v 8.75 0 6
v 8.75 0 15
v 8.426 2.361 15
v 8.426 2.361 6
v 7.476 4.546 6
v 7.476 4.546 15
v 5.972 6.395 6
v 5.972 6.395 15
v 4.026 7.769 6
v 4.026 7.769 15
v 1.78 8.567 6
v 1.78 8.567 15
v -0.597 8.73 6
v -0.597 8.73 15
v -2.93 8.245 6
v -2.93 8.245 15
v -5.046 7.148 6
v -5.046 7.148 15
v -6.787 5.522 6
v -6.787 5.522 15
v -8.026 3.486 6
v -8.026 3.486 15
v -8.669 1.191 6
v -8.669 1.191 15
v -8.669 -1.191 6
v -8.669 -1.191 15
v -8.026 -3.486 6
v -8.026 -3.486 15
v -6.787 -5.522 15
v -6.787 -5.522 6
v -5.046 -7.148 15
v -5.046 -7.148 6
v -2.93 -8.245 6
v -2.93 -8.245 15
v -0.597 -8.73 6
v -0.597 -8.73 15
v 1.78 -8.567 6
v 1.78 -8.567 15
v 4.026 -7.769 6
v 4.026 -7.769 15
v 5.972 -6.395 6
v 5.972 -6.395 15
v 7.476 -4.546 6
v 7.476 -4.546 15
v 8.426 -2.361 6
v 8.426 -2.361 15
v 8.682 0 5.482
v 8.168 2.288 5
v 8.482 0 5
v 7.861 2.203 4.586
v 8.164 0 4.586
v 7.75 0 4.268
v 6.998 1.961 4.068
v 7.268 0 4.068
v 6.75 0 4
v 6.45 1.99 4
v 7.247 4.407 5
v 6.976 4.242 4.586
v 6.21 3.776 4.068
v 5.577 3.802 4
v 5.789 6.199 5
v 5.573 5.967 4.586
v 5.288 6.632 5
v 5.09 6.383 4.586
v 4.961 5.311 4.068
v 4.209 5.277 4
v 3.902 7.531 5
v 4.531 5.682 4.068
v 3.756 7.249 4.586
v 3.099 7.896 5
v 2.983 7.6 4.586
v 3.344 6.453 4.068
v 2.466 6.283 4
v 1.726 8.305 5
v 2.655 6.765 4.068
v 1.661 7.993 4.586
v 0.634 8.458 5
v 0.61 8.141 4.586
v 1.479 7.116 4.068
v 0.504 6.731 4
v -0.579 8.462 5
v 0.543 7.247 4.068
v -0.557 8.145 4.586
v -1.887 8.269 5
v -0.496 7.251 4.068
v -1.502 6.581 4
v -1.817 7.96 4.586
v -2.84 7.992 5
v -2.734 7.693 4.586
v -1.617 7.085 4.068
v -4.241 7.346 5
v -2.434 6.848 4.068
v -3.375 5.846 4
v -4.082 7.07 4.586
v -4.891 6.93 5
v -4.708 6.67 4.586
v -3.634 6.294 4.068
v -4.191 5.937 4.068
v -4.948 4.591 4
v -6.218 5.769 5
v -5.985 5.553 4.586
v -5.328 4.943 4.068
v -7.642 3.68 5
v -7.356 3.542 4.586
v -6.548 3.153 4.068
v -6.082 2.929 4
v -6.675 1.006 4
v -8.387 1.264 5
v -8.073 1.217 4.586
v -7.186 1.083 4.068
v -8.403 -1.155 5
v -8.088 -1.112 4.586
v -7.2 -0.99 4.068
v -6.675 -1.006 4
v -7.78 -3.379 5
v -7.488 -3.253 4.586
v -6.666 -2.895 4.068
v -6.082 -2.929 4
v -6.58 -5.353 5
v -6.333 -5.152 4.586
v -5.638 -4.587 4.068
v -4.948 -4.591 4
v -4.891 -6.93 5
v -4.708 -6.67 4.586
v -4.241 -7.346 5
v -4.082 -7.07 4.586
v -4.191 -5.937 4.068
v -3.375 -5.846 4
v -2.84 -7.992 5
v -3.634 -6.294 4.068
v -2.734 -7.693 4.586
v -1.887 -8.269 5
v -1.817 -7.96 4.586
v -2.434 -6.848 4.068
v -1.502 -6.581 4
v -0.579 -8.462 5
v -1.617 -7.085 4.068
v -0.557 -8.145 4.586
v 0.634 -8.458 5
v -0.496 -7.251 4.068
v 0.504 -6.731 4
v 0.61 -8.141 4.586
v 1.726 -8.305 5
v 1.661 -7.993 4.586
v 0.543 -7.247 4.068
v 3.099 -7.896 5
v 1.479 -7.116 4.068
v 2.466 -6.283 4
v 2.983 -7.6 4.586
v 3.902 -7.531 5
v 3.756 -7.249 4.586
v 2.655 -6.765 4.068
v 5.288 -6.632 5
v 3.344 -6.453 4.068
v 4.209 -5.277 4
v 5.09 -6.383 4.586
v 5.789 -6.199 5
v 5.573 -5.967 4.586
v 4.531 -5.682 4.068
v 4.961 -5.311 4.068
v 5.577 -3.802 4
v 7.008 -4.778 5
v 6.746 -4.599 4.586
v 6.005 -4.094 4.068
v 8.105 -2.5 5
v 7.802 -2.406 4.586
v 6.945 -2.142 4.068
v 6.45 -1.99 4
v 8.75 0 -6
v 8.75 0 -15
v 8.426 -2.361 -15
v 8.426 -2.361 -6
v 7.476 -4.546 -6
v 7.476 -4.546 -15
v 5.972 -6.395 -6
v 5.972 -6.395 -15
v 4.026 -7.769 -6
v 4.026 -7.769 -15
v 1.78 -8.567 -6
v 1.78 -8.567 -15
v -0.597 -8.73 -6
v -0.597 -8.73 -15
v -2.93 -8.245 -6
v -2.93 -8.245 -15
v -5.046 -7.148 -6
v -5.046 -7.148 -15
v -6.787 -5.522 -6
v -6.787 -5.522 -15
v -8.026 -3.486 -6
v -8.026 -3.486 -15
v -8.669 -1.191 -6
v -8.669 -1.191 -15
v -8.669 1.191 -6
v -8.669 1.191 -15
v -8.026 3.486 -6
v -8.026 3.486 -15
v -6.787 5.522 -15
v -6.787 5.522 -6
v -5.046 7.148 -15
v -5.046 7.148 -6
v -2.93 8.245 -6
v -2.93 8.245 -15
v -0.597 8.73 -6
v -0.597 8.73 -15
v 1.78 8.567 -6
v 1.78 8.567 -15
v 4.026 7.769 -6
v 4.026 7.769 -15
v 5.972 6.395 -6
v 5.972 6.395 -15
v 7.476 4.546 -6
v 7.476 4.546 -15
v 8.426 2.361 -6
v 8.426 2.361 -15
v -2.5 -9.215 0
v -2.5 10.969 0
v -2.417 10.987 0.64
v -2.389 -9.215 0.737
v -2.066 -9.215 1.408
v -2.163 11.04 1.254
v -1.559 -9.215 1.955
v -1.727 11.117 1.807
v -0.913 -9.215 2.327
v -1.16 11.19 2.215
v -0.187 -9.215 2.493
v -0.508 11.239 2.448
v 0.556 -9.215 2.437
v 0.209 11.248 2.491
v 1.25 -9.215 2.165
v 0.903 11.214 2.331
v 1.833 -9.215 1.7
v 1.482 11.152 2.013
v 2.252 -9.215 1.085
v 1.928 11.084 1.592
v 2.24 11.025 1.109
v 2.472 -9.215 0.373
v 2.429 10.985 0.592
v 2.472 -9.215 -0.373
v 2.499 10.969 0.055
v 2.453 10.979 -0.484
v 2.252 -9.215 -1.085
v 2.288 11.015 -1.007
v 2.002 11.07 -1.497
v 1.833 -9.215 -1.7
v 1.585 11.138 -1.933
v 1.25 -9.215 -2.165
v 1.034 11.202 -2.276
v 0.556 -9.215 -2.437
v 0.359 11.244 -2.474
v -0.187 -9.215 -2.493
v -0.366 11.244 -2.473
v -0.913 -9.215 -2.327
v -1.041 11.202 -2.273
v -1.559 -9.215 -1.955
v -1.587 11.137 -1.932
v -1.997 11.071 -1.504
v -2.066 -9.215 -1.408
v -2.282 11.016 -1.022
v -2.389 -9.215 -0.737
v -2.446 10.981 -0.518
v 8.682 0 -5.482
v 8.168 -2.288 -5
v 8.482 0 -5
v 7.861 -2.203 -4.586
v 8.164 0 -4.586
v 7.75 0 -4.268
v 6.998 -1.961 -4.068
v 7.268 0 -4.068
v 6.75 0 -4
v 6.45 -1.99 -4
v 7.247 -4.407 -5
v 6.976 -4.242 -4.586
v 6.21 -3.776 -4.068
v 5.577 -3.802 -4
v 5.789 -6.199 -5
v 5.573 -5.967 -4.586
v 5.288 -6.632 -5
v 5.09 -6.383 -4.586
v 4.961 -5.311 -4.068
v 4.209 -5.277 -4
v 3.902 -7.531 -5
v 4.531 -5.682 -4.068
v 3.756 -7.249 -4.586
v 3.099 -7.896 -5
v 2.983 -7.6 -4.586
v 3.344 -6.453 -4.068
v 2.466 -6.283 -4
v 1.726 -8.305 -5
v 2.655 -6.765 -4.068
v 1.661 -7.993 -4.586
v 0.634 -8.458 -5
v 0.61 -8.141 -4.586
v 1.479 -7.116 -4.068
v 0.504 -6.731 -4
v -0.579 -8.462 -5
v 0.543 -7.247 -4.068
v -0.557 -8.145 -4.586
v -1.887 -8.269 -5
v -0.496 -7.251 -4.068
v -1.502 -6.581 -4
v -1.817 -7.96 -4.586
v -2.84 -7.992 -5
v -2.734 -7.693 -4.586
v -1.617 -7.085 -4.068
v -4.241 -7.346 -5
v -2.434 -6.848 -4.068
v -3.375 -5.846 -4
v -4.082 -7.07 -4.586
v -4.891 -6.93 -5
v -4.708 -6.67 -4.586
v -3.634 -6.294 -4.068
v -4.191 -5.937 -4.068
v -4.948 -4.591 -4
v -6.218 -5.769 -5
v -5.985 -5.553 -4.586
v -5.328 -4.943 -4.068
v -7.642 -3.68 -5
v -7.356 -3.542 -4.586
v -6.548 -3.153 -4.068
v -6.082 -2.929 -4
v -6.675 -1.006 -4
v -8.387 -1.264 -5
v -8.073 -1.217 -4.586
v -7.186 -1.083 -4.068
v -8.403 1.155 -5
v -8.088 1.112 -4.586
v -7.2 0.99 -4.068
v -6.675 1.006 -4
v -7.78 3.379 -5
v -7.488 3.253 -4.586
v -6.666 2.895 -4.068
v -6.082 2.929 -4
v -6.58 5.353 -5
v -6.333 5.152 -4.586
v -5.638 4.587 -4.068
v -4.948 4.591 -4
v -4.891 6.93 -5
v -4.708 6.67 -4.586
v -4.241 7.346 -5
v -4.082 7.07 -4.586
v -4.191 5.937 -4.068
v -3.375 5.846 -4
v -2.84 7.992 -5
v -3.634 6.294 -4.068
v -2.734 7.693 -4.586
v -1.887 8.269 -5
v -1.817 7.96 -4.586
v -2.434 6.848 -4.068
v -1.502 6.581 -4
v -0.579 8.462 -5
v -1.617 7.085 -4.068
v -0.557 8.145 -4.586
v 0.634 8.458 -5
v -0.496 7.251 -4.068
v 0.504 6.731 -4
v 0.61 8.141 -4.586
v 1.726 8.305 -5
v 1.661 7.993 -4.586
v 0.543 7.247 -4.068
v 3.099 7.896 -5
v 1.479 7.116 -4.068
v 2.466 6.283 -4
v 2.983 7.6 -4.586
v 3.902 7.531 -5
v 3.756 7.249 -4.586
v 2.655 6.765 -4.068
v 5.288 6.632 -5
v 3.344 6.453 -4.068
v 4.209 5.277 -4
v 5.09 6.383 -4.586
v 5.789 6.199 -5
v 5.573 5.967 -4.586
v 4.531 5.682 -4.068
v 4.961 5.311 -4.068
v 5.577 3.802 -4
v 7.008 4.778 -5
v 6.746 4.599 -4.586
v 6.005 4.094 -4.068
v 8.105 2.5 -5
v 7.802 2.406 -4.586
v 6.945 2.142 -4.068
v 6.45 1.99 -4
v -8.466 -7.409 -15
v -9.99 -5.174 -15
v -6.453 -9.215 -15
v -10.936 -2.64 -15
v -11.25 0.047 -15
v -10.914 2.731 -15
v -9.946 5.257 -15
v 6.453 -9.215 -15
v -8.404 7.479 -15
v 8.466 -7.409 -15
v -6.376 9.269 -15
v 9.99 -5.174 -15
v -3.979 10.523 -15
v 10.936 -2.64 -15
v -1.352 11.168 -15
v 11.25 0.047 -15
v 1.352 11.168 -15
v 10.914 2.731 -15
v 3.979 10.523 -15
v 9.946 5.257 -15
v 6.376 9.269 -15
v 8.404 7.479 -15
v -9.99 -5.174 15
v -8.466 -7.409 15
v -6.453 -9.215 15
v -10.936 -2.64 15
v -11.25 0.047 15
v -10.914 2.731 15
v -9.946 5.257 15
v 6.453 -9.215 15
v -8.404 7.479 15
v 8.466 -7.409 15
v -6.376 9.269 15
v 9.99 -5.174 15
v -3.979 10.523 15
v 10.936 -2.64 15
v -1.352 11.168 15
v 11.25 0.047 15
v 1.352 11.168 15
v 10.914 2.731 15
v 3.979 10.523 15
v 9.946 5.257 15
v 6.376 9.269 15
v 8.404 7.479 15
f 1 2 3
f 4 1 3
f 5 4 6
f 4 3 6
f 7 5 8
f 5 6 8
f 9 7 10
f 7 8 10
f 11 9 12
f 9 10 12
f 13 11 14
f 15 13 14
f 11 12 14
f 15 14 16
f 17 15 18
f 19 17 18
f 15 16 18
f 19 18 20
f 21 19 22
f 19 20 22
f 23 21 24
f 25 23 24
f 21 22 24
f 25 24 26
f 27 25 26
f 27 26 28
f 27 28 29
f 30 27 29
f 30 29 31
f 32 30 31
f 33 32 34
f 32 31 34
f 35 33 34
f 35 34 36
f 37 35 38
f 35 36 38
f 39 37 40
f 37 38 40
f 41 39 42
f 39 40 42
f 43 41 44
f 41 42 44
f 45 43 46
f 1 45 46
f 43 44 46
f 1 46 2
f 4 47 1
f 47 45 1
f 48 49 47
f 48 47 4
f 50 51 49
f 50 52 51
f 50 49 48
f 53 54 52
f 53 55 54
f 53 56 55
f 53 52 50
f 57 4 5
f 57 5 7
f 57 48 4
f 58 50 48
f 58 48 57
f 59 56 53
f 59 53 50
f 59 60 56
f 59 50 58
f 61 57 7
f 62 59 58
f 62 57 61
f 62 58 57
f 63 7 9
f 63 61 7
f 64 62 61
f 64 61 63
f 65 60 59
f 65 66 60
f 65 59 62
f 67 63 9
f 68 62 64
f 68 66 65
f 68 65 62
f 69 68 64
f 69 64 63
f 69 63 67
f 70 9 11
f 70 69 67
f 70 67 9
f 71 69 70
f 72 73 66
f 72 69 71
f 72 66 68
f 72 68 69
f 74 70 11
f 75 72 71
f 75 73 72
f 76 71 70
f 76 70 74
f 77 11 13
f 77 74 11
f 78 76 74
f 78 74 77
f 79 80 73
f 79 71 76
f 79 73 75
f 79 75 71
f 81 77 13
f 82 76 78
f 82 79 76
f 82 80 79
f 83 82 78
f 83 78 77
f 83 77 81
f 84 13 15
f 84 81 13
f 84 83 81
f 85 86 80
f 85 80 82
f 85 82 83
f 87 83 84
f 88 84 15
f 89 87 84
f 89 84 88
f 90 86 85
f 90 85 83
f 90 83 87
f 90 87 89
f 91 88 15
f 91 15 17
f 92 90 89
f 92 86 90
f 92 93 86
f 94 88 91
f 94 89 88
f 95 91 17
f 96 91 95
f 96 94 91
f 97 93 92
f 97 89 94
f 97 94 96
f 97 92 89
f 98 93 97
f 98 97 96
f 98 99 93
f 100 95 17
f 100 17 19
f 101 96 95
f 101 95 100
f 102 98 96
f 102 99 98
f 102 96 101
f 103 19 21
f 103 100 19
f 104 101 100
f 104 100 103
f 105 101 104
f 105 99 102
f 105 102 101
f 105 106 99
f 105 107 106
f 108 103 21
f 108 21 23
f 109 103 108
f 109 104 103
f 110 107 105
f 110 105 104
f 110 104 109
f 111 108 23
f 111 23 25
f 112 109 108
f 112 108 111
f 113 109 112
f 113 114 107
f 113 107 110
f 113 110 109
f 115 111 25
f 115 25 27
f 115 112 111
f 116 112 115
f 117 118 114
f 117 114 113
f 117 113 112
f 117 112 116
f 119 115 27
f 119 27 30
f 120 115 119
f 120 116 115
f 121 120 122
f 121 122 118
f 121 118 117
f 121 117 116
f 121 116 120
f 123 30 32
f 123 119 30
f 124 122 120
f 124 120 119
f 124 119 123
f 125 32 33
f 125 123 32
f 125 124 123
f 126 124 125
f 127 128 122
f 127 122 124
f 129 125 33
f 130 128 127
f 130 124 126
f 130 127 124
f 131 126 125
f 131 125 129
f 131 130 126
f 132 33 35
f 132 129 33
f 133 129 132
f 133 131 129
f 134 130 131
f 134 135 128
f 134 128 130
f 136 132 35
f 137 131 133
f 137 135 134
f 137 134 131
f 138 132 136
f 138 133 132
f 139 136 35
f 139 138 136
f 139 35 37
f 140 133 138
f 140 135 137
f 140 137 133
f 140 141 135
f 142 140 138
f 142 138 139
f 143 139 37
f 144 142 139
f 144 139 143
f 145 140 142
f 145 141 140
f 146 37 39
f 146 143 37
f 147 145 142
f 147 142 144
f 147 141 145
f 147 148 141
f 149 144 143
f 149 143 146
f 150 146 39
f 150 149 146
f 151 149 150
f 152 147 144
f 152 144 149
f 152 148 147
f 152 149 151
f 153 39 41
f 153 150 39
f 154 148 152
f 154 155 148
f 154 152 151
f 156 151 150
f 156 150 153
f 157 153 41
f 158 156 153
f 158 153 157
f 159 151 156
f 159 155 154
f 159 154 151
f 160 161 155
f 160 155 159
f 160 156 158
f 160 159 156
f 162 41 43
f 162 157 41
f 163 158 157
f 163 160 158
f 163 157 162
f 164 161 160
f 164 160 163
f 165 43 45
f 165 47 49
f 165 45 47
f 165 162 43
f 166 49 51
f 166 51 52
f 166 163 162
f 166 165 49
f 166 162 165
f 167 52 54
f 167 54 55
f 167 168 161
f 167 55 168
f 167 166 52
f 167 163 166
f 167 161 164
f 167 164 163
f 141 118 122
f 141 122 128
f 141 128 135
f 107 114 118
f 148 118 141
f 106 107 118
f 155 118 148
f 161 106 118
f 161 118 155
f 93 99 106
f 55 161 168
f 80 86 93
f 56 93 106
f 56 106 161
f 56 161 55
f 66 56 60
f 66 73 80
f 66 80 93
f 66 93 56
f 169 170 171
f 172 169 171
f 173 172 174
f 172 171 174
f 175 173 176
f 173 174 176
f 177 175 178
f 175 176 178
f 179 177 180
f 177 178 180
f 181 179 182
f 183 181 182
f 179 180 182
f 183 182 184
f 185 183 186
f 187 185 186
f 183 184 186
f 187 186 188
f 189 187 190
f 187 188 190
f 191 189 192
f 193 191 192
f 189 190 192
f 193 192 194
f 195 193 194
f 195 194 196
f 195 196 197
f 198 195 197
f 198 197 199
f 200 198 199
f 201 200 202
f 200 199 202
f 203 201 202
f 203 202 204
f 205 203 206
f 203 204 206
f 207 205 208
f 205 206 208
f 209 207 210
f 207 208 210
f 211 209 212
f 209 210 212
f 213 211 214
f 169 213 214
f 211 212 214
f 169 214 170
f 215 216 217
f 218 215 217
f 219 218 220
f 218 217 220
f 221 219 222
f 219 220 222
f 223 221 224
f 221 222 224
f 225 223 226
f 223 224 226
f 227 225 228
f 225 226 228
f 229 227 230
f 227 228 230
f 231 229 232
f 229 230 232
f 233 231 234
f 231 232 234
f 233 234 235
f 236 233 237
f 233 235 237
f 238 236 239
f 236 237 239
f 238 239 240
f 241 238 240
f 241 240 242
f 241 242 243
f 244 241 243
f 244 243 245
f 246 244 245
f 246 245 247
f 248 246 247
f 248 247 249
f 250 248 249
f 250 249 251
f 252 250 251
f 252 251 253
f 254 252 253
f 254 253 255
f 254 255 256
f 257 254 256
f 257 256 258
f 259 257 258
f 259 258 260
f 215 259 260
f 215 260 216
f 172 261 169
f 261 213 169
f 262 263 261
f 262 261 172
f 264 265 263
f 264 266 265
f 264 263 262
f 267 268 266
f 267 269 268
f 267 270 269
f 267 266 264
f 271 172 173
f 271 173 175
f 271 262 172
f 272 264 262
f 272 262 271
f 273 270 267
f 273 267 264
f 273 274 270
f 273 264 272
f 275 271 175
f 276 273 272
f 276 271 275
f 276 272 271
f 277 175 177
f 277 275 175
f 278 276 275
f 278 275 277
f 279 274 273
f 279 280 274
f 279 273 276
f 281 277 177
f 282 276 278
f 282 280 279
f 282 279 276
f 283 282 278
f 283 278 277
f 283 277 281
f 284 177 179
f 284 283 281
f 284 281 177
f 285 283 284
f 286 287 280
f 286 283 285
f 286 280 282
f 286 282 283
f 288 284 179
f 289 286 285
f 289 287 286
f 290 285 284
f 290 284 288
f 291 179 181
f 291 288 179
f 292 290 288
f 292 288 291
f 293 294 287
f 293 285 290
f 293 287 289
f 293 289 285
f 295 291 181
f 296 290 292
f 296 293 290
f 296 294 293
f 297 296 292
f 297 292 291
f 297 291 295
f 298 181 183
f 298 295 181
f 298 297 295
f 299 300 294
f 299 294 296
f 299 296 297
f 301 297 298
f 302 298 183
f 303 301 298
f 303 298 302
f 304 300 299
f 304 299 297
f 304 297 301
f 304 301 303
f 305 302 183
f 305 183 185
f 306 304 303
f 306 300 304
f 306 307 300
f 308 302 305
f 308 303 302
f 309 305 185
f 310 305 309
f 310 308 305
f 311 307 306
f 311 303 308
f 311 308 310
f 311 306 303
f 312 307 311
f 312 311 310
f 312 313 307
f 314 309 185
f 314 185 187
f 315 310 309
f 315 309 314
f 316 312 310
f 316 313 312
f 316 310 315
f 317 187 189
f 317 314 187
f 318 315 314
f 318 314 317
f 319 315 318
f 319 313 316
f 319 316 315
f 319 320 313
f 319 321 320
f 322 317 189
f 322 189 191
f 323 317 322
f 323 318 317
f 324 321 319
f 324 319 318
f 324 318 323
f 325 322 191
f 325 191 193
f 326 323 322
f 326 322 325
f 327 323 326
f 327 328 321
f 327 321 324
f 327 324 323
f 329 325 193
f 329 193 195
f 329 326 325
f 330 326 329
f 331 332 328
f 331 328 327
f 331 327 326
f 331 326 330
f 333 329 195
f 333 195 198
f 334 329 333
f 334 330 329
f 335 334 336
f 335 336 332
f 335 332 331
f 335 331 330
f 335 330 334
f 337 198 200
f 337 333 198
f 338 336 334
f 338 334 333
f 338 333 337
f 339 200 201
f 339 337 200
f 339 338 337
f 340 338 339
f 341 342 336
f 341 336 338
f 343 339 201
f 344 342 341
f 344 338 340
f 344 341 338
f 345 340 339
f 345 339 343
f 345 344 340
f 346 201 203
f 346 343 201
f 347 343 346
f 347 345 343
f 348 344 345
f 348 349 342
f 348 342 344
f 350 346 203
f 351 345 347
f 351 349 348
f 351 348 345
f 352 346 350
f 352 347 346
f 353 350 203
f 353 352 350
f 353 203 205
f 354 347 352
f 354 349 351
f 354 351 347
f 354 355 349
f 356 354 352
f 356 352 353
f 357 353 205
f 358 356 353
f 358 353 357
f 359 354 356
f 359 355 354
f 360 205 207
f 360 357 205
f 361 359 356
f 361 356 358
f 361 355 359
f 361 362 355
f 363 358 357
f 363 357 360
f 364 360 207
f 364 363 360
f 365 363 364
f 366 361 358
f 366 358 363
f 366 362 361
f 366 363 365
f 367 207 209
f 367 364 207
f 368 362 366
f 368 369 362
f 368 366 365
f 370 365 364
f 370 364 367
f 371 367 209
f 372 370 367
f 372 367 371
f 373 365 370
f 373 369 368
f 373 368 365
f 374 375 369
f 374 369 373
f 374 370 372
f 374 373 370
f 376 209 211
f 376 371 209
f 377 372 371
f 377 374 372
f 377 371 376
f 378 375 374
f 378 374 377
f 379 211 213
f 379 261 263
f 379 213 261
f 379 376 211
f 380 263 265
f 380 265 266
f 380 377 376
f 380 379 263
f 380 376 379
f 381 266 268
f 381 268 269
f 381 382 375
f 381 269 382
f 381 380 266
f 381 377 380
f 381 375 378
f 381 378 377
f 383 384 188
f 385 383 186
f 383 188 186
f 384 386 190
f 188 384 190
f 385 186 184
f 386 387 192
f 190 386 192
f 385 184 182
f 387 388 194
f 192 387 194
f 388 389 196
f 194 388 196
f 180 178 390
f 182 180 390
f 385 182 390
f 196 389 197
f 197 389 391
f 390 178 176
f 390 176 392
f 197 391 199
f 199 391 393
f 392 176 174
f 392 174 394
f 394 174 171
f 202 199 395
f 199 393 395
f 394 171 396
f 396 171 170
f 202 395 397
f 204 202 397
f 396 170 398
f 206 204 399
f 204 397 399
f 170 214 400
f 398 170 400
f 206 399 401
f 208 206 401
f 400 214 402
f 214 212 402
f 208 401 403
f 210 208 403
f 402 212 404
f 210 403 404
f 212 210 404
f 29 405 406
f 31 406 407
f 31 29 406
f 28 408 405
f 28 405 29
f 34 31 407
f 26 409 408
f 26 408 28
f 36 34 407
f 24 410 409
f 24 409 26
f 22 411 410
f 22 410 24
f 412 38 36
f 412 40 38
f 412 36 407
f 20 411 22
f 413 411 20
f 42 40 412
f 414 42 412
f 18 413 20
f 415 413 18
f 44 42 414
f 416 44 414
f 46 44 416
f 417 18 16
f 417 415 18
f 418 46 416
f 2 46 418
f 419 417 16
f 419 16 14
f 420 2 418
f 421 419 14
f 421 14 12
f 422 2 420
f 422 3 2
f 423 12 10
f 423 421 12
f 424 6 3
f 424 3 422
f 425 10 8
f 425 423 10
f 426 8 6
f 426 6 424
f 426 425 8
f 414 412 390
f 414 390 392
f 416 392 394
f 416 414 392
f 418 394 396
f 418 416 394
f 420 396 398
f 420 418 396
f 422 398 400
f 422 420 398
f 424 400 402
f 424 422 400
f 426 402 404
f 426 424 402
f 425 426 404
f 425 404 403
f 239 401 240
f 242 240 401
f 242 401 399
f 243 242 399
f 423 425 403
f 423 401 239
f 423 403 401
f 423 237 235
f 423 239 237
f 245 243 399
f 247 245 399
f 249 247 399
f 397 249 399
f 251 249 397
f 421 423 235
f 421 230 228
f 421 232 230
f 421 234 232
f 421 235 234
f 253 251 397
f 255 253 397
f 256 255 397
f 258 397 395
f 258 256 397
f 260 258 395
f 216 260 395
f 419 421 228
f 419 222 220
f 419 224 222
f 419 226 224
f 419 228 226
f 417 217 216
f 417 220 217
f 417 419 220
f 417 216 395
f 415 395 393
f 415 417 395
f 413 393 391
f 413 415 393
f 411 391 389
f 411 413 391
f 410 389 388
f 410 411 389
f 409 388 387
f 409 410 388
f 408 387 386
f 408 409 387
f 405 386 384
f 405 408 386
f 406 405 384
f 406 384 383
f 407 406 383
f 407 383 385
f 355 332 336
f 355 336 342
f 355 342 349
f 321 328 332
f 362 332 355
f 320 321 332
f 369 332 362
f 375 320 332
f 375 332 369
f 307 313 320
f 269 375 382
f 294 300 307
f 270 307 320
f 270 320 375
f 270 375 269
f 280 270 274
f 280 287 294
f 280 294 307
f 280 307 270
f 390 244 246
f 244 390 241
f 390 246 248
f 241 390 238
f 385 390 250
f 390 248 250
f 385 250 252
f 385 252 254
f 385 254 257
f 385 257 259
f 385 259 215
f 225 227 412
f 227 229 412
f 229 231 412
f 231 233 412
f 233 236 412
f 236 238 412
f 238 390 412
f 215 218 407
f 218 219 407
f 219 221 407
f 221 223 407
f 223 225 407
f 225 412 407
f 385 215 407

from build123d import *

# Parameters (mm, degrees)
F0_R          = 11.25
F1_DEPTH      = 15
F1_DEPTH_BACK = 15
F4_DEPTH      = 30.001
F2_R          = 8.75
F5_DEPTH      = 11
F3_R          = 8.75
F6_DEPTH      = 11
F8_D          = 5
F9_R          = 2
F10_R         = 2


with BuildPart() as f1:
    # F0 (on Top) → F1 (new body, two sides)
    with BuildSketch(Plane.XY) as f1_sk:
        Circle(F0_R)
    extrude(amount=F1_DEPTH)
    extrude(f1_sk.sketch, amount=-F1_DEPTH_BACK)

    # F2 (on face) → F4 (cut, through all)
    with BuildSketch(Plane.XY.offset(15)):
        with BuildLine():
            Line((6.4527349089, -9.2154604983), (-6.4527349089, -9.2154604983))
            ThreePointArc((-6.4527349089, -9.2154604983), (0, -11.25), (6.4527349089, -9.2154604983))
        make_face()
    extrude(amount=-F4_DEPTH, mode=Mode.SUBTRACT)

    # F2 (on face) → F5 (cut)
    with BuildSketch(Plane.XY.offset(15)):
        Circle(F2_R)
    extrude(amount=-F5_DEPTH, mode=Mode.SUBTRACT)

    # F3 (on face) → F6 (cut)
    with BuildSketch(Plane(origin=(0, 0, -15), x_dir=(1, 0, 0), z_dir=(0, 0, -1))):
        Circle(F3_R)
    extrude(amount=-F6_DEPTH, mode=Mode.SUBTRACT)

    # F8 (through all)
    with Locations(Plane.XZ.offset(9.2154604983)):
        with Locations((0, 0)):
            Hole(F8_D / 2)

    # F9
    f9_edges = [f1.edges().sort_by_distance(p)[0] for p in [
        (-8.75, 0, 4),
    ]]
    fillet(f9_edges, radius=F9_R)

    # F10
    f10_edges = [f1.edges().sort_by_distance(p)[0] for p in [
        (-8.75, 0, -4),
    ]]
    fillet(f10_edges, radius=F10_R)


solid = f1.part
